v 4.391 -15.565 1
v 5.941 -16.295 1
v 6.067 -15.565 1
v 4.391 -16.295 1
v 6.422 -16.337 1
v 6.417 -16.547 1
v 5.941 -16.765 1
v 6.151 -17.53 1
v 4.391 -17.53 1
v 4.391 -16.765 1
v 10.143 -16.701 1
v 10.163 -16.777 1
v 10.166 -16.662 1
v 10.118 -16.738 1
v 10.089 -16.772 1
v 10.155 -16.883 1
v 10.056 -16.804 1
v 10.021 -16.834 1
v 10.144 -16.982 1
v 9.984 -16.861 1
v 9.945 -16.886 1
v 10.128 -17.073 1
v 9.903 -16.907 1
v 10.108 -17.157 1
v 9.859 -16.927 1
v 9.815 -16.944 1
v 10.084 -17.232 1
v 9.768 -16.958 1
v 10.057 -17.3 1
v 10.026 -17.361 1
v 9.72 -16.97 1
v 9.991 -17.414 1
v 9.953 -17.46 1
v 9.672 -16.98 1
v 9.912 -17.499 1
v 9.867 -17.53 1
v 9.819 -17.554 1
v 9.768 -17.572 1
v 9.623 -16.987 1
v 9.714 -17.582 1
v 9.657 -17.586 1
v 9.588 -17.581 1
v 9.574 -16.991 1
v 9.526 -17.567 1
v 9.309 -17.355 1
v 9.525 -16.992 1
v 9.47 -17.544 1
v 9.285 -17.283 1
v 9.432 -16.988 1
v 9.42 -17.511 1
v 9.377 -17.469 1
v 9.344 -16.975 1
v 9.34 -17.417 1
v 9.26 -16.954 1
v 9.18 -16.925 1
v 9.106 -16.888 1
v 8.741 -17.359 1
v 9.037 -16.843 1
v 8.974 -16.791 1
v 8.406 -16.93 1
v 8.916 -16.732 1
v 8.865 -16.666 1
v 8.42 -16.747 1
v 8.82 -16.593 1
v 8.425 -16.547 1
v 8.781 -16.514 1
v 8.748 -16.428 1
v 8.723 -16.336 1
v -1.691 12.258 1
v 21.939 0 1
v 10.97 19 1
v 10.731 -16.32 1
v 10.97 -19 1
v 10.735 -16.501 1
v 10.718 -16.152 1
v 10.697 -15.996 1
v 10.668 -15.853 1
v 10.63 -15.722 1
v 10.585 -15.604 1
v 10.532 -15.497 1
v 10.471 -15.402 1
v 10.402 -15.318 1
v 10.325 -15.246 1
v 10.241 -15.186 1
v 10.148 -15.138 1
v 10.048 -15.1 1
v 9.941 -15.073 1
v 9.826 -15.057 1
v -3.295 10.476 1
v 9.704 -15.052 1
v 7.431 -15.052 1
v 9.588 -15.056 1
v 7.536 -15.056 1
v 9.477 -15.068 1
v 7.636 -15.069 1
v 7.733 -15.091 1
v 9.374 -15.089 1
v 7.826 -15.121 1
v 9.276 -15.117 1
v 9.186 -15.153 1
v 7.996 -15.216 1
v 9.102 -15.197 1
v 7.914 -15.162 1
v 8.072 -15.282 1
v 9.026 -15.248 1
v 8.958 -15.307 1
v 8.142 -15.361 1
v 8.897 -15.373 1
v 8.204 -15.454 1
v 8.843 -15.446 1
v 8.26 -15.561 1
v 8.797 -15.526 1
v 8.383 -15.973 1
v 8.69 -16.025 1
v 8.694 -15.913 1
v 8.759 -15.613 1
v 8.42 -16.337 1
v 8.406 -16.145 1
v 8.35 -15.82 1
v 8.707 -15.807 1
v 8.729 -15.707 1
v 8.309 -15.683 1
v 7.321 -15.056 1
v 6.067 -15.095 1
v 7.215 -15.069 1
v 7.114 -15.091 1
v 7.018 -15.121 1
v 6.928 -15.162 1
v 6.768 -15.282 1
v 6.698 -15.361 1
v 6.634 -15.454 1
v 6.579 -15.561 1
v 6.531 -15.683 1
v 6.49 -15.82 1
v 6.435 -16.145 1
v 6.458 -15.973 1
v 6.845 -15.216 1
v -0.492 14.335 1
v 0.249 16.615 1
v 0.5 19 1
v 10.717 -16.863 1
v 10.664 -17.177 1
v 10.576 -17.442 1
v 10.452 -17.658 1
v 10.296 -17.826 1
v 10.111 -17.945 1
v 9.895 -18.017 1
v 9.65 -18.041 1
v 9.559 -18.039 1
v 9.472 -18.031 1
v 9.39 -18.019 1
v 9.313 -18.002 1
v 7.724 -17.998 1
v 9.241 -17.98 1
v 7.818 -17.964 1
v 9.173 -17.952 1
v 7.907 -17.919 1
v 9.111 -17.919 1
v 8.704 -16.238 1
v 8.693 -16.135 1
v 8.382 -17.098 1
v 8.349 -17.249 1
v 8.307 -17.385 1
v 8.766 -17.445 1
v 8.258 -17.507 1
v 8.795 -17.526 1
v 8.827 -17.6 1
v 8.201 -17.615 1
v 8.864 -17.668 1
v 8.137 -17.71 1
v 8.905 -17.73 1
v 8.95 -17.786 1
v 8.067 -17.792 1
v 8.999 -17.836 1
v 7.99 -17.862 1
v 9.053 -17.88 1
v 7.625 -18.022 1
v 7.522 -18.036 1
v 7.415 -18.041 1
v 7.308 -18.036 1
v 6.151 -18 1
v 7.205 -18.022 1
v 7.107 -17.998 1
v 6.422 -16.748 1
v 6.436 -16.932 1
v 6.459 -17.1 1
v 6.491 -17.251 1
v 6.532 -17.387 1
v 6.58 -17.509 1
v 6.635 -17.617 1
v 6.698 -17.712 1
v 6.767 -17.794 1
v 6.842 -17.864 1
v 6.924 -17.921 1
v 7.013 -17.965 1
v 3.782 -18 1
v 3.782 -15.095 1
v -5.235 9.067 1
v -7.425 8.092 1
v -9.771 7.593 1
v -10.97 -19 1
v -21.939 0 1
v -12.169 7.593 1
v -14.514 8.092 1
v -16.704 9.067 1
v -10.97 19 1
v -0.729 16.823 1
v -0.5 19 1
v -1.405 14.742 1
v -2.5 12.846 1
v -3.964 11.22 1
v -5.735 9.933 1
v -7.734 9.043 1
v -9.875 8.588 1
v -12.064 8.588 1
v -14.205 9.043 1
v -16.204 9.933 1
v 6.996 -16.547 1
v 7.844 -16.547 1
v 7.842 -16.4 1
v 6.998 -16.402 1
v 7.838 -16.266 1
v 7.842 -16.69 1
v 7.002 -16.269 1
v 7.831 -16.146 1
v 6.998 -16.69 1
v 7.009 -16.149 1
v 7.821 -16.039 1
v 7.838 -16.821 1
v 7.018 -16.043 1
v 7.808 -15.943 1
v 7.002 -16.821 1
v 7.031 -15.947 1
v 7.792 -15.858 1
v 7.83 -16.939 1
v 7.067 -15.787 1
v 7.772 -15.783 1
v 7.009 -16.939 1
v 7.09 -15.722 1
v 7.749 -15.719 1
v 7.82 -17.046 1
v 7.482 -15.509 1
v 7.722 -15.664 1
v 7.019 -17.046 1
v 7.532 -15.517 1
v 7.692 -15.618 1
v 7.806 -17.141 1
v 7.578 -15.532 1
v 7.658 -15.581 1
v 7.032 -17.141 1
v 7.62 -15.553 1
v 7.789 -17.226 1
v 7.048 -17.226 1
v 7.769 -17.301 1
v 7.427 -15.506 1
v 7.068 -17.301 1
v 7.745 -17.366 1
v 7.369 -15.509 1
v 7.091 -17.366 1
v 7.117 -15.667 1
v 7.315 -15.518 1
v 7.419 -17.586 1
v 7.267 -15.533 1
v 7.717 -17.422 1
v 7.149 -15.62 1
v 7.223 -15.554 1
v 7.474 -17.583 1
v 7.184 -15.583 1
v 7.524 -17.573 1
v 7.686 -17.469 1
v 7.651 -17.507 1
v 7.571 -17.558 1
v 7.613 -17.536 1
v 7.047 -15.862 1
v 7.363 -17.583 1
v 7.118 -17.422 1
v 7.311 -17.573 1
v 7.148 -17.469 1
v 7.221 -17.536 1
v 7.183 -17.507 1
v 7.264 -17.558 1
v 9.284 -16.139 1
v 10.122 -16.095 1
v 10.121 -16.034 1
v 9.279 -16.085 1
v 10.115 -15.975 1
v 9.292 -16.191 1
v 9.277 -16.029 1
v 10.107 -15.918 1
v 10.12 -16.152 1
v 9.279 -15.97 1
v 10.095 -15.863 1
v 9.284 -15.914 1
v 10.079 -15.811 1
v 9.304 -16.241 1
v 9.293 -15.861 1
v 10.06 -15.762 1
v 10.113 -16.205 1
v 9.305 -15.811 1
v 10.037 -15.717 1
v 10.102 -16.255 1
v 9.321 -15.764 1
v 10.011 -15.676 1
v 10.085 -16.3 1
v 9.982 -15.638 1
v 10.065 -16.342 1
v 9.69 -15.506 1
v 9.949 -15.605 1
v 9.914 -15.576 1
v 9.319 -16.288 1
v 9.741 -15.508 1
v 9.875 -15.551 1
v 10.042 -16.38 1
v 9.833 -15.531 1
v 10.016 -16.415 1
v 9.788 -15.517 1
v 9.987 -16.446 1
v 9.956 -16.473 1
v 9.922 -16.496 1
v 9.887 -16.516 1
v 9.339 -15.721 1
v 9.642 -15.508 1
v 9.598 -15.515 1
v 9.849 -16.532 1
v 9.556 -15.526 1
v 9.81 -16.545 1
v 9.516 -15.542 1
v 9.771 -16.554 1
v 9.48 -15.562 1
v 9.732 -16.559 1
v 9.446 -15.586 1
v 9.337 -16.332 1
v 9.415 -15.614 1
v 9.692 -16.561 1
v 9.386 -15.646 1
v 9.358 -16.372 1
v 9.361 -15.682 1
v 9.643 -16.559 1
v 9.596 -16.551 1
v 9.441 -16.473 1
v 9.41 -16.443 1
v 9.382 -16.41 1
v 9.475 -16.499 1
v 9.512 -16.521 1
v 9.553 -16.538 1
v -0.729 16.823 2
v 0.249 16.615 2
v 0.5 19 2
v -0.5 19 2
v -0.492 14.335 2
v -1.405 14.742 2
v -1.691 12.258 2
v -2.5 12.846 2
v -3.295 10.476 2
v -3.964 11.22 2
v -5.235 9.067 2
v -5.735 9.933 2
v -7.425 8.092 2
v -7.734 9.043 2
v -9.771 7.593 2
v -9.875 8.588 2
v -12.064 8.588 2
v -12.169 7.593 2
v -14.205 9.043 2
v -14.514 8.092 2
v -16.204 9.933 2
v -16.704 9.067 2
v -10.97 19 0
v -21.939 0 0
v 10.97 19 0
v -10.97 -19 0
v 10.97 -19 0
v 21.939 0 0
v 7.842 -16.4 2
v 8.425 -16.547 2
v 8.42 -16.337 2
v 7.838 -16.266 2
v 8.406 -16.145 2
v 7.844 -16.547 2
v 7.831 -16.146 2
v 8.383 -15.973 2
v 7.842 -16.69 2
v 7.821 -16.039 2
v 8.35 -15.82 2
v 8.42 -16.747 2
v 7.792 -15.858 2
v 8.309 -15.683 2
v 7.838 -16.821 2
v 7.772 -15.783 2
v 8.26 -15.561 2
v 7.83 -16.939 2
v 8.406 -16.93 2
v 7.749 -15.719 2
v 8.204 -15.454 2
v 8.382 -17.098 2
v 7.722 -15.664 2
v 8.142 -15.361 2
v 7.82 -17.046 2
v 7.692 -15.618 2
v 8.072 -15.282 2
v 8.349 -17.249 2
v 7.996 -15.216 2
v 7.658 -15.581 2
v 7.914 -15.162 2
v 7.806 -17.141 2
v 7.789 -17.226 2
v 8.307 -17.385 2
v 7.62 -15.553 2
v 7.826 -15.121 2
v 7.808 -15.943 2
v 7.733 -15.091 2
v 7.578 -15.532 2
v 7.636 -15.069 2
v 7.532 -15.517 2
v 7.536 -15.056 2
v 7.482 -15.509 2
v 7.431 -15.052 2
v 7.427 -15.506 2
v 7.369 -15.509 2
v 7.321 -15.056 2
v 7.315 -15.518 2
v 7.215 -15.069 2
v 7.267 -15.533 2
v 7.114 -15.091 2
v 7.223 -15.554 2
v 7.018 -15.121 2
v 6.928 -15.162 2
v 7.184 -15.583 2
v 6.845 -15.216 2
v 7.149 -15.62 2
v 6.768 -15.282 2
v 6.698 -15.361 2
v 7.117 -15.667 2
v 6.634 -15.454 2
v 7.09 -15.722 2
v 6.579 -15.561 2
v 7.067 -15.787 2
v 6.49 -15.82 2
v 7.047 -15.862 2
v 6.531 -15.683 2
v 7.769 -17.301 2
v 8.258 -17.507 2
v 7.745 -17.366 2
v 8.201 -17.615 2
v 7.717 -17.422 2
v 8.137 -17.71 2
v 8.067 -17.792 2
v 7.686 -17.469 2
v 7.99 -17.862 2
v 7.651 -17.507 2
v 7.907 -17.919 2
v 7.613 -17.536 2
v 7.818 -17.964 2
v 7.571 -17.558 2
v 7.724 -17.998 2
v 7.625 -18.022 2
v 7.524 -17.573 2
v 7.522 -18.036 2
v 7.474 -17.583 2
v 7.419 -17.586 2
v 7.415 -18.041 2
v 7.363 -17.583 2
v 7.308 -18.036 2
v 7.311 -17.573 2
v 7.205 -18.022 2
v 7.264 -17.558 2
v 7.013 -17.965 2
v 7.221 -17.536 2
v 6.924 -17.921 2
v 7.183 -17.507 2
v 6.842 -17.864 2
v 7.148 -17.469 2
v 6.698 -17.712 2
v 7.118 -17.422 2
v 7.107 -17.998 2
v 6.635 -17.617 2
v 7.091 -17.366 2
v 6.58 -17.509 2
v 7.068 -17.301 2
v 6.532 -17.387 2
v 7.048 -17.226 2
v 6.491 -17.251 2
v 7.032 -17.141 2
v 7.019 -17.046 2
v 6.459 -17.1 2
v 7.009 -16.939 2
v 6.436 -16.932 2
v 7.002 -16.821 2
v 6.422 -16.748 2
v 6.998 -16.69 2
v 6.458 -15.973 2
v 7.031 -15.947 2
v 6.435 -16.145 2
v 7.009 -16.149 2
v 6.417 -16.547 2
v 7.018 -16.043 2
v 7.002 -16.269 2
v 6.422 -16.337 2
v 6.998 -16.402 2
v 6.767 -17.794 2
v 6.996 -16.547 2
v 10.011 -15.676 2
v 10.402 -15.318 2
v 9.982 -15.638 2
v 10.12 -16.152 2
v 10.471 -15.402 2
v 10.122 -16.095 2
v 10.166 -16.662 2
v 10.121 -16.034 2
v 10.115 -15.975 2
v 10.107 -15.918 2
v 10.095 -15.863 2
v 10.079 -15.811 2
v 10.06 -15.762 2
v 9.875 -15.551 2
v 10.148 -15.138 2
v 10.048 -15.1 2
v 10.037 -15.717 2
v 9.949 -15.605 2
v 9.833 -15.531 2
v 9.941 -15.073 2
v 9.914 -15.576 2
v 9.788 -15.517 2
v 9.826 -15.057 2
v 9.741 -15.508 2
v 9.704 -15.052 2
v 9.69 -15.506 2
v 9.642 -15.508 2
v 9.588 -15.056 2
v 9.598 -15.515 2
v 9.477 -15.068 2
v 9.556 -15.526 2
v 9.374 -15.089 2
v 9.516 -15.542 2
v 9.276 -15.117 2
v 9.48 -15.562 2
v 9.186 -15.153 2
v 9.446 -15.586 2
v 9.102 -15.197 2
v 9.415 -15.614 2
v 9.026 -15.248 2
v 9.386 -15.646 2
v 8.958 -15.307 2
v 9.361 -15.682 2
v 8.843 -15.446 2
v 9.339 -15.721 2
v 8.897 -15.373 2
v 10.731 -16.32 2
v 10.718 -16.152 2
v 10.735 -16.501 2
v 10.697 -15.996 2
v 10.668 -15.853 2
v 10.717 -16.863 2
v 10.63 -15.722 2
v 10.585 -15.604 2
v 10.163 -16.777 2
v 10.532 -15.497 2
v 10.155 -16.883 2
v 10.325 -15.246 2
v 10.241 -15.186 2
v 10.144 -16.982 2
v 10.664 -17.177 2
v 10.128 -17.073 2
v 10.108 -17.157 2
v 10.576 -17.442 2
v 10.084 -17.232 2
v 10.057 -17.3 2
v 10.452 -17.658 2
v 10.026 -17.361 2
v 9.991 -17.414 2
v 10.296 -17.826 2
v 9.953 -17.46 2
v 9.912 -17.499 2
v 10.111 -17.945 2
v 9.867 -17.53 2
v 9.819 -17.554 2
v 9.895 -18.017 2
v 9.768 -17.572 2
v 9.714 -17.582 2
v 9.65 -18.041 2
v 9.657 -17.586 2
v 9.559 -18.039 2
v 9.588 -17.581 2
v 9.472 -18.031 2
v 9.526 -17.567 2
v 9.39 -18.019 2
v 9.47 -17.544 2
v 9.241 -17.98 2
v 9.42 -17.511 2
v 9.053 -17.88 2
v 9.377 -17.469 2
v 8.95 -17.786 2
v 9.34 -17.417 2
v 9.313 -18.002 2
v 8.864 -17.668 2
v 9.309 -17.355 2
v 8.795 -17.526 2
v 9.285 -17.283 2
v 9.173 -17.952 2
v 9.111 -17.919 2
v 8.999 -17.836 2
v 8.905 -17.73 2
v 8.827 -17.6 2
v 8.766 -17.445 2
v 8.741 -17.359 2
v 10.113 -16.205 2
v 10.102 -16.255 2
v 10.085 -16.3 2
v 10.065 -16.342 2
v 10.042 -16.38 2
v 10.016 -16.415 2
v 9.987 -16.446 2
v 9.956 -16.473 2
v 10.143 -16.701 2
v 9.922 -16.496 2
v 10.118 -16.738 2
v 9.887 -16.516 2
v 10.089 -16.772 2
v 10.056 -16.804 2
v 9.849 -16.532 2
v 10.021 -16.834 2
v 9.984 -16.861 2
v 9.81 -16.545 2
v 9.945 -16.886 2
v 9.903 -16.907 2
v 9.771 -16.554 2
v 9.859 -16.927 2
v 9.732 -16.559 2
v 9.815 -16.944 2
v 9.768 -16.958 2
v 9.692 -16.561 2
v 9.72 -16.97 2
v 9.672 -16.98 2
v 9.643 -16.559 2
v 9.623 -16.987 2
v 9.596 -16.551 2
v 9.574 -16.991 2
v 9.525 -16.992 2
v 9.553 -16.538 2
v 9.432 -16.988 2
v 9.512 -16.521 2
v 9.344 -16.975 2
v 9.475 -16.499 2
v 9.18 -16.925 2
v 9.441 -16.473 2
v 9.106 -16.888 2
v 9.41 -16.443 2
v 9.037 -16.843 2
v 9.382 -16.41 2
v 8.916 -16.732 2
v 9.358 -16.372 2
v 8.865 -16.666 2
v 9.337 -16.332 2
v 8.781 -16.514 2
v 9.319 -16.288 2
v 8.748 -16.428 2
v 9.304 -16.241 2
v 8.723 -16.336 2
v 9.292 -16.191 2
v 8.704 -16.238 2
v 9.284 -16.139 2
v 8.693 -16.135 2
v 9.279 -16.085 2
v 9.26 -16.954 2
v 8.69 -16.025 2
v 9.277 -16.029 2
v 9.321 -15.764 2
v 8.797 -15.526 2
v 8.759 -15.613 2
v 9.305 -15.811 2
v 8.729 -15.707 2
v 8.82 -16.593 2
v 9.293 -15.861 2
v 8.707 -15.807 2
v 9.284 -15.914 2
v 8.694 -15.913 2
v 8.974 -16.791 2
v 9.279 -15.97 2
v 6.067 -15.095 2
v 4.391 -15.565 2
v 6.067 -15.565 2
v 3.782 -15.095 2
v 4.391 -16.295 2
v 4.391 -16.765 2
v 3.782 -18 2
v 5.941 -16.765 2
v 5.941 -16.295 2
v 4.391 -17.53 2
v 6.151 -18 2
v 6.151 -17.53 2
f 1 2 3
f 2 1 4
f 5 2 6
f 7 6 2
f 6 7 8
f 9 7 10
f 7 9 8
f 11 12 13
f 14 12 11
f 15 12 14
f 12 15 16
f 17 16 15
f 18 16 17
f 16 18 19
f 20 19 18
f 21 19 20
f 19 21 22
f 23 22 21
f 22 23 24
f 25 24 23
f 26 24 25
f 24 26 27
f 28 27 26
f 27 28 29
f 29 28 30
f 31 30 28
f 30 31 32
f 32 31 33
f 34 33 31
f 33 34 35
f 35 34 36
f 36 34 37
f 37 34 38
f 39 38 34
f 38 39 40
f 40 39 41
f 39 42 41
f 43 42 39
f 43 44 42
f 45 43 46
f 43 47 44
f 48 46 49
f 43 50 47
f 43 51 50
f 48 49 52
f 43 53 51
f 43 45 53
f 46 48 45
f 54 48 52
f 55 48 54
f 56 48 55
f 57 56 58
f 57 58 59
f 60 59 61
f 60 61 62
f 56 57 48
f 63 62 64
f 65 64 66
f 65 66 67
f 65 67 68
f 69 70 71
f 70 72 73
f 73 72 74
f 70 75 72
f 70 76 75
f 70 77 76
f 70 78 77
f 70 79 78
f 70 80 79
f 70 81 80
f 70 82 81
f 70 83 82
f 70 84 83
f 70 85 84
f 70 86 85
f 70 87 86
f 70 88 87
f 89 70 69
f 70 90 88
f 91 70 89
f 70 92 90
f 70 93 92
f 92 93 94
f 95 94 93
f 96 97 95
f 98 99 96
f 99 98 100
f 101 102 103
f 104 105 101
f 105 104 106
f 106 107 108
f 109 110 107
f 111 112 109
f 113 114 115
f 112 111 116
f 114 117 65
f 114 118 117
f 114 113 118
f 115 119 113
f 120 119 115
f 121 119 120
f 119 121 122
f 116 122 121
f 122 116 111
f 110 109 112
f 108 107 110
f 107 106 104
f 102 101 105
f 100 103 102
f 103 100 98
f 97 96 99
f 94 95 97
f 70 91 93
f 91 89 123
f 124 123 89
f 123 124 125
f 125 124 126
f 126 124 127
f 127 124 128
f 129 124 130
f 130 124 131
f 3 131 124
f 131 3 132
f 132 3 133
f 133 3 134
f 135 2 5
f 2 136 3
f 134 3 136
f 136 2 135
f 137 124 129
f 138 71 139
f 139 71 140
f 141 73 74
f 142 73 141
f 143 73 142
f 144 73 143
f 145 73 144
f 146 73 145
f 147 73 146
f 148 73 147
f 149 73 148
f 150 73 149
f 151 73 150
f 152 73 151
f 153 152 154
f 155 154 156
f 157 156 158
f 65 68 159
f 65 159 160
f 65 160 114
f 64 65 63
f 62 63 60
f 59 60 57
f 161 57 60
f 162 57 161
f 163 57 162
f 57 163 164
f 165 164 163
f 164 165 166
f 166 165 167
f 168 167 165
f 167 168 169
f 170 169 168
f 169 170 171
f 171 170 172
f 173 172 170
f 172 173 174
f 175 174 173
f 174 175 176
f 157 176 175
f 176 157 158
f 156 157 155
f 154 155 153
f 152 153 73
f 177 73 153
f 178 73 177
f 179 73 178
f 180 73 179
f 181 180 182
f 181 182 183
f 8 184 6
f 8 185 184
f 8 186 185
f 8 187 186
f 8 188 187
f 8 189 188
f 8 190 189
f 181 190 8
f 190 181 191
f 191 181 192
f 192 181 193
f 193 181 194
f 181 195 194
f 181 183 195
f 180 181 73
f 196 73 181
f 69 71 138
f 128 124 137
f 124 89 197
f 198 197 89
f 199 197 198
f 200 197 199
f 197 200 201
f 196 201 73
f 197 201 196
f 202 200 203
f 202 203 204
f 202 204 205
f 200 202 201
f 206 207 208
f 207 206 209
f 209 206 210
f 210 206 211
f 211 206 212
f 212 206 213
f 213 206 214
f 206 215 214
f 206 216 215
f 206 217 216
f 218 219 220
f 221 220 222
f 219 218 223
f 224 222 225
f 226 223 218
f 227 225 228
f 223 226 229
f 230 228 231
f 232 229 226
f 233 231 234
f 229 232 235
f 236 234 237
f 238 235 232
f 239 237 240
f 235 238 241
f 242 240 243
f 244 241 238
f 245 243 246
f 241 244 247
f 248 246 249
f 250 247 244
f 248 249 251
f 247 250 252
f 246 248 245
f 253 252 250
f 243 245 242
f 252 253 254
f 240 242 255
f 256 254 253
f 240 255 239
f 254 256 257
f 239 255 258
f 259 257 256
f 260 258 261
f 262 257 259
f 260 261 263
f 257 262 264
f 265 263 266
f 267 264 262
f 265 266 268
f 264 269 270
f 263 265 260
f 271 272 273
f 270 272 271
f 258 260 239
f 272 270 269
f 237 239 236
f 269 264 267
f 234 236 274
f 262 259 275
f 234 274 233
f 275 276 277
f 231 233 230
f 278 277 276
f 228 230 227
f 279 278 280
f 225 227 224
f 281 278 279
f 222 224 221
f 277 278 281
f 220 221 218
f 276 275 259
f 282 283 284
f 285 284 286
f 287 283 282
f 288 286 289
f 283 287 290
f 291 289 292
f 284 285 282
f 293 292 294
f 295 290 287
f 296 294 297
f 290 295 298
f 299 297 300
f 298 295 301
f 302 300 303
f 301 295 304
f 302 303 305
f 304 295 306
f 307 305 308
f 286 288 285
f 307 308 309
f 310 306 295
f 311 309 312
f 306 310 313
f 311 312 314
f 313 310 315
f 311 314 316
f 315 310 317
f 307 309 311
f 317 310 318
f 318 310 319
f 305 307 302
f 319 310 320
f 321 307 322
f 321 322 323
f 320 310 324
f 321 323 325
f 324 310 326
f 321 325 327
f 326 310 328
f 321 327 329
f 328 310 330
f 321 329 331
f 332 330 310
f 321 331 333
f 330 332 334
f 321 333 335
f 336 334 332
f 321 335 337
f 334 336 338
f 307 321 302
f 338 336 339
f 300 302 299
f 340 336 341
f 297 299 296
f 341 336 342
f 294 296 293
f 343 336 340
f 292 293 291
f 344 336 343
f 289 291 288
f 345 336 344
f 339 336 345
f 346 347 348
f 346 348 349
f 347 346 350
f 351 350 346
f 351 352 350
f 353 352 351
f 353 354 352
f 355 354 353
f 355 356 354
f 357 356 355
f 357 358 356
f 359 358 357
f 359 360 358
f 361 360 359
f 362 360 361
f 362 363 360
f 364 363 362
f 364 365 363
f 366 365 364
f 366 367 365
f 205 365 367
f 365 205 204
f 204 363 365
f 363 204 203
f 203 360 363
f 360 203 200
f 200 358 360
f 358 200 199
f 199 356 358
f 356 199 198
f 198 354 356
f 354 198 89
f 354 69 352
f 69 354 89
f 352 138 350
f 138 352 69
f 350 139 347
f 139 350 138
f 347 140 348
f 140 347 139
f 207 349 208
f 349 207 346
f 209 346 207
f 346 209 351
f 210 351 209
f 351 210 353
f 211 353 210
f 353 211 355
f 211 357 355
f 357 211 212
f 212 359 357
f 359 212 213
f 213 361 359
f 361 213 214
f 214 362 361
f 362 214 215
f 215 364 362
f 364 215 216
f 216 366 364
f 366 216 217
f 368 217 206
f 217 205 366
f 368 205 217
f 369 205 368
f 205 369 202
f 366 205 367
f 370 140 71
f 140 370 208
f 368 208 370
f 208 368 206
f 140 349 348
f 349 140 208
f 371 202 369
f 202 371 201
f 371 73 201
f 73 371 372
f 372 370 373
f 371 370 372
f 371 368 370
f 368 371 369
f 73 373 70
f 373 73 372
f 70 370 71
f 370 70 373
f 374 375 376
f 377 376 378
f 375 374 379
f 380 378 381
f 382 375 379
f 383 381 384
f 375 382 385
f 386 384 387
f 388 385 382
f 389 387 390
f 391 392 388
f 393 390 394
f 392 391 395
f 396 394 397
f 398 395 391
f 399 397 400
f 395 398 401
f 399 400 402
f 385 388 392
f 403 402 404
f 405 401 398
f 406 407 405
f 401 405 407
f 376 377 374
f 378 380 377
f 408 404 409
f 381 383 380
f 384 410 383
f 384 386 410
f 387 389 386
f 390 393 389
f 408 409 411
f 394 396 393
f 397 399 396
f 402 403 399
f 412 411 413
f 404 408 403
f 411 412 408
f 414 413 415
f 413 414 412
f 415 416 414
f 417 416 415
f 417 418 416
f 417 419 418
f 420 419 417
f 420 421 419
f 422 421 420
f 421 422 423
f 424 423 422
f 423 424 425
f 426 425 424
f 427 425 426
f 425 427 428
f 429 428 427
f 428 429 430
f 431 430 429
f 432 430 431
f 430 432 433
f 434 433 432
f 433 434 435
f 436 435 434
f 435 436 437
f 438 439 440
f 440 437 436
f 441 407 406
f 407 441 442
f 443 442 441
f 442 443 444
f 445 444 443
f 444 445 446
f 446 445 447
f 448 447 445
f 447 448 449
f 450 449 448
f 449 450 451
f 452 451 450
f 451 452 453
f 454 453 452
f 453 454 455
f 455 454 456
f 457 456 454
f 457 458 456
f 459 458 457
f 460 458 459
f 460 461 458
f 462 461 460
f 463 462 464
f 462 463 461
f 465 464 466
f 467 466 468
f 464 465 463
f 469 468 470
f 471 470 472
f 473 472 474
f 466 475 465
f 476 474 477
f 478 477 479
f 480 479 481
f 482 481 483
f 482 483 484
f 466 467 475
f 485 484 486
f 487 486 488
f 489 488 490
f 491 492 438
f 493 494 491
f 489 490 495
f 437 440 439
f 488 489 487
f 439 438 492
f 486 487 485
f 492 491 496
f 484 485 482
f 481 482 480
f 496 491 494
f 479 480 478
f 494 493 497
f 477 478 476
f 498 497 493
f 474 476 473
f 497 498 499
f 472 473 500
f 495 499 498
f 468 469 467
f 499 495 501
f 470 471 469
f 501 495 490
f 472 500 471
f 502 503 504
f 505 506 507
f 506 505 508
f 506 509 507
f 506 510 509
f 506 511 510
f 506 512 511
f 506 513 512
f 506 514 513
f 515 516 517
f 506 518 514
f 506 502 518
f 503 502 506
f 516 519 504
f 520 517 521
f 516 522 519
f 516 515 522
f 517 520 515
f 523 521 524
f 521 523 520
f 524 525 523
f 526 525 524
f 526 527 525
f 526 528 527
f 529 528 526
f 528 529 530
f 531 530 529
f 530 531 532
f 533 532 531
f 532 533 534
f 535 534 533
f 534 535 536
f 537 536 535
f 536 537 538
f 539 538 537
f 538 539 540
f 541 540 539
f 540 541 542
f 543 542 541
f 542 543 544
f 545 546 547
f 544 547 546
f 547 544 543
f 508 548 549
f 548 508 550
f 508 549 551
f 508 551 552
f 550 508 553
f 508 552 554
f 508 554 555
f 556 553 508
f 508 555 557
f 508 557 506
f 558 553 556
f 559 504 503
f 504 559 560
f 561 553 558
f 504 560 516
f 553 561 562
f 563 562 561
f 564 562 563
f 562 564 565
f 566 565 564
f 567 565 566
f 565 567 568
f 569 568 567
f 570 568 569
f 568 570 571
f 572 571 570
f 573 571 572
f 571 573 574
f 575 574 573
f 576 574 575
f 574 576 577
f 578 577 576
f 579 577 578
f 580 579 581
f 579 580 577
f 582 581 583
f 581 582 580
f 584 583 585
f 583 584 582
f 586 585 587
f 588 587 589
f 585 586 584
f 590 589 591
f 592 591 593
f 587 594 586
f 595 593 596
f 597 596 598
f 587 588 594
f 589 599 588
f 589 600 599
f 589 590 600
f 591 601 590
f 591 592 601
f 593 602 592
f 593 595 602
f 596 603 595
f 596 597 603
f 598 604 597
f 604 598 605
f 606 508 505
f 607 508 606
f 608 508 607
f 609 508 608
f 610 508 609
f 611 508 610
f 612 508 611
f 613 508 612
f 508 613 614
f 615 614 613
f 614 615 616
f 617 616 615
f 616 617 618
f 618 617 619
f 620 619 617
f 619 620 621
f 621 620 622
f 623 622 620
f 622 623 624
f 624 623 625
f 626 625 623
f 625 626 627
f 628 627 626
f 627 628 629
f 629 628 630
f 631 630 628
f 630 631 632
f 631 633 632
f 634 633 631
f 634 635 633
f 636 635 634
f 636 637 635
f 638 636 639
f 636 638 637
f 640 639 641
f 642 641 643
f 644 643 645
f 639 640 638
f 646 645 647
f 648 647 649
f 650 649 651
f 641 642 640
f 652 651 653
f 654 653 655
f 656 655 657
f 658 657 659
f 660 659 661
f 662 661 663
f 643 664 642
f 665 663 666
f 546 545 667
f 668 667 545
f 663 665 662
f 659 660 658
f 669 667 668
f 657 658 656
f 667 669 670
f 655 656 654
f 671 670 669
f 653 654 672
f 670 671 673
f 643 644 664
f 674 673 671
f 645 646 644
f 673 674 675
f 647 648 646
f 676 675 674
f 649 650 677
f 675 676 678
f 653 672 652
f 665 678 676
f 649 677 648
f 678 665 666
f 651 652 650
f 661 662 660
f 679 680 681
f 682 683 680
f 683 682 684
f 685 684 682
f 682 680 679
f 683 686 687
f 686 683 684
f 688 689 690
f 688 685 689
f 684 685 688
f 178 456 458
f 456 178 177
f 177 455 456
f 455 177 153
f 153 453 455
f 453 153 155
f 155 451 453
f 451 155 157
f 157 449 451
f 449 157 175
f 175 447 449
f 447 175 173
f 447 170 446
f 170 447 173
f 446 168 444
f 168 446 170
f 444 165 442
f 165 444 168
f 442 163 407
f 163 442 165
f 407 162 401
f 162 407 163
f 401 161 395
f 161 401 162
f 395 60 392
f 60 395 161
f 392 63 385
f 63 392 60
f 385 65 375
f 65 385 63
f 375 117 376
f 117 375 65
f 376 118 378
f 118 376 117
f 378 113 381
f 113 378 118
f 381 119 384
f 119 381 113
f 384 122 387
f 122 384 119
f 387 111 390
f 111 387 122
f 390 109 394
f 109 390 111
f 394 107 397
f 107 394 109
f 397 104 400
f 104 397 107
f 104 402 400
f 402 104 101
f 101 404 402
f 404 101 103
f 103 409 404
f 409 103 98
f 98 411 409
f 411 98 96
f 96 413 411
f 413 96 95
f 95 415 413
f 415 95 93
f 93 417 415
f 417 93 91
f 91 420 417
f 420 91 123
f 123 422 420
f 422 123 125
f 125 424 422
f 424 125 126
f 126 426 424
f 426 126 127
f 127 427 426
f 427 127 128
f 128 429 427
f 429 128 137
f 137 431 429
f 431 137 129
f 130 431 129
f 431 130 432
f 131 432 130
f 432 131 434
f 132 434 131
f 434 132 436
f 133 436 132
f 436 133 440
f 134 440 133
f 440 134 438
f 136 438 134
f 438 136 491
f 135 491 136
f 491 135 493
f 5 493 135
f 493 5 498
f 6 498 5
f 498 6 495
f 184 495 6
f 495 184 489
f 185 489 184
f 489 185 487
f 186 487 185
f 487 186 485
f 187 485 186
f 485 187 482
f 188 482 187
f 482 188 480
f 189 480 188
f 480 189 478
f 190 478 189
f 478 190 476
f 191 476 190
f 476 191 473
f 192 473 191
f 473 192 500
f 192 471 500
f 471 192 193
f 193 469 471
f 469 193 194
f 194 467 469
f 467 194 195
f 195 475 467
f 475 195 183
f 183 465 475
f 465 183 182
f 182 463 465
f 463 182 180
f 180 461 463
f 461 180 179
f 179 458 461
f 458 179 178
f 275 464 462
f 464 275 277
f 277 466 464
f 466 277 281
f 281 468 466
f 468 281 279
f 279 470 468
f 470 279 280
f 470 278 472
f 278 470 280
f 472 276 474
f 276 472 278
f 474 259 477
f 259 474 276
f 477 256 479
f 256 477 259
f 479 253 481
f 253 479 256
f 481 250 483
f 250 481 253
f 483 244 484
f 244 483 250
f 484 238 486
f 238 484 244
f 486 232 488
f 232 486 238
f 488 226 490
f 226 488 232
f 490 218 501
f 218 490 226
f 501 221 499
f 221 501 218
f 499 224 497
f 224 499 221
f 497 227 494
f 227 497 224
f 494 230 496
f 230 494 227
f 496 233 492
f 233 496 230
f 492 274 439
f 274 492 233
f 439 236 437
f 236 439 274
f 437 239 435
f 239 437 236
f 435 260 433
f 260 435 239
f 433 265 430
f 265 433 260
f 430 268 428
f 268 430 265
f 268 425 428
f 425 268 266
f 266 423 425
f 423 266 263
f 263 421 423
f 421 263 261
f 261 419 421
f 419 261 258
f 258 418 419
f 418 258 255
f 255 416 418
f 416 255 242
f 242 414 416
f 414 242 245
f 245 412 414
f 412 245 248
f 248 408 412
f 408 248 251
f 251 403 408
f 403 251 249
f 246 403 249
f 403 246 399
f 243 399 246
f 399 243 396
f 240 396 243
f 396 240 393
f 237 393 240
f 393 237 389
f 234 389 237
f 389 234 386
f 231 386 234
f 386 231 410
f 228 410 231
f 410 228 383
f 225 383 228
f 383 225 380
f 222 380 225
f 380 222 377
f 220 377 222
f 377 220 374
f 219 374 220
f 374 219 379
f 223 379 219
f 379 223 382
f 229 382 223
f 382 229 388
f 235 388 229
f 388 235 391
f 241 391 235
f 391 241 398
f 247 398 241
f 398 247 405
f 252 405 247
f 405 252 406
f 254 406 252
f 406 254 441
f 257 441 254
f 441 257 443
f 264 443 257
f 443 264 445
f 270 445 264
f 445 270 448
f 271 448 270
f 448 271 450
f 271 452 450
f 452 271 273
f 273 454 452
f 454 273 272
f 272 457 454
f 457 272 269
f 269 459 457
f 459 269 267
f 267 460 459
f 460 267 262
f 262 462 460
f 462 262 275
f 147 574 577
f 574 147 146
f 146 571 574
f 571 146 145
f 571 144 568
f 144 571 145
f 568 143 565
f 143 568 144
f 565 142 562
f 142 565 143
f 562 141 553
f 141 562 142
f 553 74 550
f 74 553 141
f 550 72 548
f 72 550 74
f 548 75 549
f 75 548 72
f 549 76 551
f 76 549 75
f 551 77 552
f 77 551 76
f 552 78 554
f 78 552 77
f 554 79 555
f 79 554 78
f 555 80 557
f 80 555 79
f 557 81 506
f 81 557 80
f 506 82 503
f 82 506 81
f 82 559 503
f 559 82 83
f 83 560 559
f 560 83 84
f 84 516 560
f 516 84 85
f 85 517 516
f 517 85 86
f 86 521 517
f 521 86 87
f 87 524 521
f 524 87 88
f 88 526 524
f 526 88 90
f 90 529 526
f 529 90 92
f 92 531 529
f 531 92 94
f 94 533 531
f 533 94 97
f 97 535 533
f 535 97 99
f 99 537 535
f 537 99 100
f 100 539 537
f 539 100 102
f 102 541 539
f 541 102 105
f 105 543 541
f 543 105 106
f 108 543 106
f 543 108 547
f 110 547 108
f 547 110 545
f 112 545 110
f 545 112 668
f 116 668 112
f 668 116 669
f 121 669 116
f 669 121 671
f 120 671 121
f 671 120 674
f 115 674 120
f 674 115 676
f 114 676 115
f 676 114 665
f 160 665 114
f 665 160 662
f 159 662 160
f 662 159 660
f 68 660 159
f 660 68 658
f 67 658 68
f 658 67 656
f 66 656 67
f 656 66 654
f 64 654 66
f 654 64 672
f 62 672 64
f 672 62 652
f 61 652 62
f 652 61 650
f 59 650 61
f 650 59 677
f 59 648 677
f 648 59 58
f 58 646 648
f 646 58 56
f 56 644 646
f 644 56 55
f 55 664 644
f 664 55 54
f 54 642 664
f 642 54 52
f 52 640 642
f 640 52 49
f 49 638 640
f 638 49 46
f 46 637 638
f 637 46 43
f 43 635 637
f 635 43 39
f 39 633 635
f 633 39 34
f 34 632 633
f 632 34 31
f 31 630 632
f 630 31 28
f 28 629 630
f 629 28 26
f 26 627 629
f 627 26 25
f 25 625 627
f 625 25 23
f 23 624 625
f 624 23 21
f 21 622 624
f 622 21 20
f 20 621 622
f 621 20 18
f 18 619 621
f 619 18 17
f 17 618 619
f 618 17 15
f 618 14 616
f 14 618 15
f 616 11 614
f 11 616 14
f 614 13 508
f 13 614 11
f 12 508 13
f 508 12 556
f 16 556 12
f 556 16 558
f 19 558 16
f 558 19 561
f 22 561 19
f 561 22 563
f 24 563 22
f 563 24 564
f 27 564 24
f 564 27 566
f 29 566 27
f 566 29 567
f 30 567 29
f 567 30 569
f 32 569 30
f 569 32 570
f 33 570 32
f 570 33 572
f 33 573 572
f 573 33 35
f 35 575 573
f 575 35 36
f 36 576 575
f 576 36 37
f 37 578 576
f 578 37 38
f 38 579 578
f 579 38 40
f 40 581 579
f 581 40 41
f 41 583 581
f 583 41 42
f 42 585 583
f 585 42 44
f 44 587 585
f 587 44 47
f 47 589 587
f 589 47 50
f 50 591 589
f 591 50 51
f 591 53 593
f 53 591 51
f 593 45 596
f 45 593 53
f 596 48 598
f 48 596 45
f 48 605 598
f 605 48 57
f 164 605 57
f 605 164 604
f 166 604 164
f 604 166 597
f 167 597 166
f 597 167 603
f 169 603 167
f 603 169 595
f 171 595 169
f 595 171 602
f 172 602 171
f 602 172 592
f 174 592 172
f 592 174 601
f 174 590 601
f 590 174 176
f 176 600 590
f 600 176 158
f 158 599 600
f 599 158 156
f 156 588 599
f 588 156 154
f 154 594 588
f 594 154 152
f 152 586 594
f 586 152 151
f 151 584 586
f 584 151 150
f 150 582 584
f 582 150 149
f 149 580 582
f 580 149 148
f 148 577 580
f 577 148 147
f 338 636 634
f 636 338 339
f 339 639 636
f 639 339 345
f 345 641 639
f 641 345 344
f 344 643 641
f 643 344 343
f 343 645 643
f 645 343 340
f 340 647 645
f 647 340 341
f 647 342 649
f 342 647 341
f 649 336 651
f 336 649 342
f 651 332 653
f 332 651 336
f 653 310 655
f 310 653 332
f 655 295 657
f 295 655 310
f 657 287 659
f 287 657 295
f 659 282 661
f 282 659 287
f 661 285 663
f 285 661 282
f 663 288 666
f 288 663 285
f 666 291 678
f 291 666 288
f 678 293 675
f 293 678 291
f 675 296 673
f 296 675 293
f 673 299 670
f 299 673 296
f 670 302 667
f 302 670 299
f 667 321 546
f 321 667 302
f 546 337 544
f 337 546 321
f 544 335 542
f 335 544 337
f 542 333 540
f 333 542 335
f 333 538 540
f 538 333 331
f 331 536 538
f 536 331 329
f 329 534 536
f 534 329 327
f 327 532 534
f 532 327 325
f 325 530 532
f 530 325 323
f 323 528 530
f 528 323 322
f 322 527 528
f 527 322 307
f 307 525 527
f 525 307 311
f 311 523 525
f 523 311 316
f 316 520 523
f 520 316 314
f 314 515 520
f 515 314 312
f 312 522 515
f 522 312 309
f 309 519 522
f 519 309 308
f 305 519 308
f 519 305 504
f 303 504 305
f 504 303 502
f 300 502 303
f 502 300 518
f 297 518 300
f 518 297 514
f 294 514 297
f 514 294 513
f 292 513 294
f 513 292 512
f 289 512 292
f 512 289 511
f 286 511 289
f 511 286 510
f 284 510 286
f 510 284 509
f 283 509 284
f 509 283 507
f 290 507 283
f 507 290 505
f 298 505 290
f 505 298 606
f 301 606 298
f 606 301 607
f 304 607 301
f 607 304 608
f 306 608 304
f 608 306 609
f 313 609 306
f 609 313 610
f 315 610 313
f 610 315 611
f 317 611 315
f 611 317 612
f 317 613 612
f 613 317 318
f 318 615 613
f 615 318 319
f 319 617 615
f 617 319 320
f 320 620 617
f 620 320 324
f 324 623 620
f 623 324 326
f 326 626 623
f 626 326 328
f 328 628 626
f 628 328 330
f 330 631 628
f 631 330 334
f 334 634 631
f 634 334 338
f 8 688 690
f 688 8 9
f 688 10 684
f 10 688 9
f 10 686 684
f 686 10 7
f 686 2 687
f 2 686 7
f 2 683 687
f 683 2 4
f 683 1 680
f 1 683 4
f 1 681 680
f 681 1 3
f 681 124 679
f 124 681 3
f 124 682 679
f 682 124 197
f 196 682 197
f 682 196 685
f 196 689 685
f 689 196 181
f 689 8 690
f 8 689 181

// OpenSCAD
include <../../Scripts/18xx tiles basic functions.scad>
hex("Blue");
sharp_curve(3);
put_tilenr("E09");
